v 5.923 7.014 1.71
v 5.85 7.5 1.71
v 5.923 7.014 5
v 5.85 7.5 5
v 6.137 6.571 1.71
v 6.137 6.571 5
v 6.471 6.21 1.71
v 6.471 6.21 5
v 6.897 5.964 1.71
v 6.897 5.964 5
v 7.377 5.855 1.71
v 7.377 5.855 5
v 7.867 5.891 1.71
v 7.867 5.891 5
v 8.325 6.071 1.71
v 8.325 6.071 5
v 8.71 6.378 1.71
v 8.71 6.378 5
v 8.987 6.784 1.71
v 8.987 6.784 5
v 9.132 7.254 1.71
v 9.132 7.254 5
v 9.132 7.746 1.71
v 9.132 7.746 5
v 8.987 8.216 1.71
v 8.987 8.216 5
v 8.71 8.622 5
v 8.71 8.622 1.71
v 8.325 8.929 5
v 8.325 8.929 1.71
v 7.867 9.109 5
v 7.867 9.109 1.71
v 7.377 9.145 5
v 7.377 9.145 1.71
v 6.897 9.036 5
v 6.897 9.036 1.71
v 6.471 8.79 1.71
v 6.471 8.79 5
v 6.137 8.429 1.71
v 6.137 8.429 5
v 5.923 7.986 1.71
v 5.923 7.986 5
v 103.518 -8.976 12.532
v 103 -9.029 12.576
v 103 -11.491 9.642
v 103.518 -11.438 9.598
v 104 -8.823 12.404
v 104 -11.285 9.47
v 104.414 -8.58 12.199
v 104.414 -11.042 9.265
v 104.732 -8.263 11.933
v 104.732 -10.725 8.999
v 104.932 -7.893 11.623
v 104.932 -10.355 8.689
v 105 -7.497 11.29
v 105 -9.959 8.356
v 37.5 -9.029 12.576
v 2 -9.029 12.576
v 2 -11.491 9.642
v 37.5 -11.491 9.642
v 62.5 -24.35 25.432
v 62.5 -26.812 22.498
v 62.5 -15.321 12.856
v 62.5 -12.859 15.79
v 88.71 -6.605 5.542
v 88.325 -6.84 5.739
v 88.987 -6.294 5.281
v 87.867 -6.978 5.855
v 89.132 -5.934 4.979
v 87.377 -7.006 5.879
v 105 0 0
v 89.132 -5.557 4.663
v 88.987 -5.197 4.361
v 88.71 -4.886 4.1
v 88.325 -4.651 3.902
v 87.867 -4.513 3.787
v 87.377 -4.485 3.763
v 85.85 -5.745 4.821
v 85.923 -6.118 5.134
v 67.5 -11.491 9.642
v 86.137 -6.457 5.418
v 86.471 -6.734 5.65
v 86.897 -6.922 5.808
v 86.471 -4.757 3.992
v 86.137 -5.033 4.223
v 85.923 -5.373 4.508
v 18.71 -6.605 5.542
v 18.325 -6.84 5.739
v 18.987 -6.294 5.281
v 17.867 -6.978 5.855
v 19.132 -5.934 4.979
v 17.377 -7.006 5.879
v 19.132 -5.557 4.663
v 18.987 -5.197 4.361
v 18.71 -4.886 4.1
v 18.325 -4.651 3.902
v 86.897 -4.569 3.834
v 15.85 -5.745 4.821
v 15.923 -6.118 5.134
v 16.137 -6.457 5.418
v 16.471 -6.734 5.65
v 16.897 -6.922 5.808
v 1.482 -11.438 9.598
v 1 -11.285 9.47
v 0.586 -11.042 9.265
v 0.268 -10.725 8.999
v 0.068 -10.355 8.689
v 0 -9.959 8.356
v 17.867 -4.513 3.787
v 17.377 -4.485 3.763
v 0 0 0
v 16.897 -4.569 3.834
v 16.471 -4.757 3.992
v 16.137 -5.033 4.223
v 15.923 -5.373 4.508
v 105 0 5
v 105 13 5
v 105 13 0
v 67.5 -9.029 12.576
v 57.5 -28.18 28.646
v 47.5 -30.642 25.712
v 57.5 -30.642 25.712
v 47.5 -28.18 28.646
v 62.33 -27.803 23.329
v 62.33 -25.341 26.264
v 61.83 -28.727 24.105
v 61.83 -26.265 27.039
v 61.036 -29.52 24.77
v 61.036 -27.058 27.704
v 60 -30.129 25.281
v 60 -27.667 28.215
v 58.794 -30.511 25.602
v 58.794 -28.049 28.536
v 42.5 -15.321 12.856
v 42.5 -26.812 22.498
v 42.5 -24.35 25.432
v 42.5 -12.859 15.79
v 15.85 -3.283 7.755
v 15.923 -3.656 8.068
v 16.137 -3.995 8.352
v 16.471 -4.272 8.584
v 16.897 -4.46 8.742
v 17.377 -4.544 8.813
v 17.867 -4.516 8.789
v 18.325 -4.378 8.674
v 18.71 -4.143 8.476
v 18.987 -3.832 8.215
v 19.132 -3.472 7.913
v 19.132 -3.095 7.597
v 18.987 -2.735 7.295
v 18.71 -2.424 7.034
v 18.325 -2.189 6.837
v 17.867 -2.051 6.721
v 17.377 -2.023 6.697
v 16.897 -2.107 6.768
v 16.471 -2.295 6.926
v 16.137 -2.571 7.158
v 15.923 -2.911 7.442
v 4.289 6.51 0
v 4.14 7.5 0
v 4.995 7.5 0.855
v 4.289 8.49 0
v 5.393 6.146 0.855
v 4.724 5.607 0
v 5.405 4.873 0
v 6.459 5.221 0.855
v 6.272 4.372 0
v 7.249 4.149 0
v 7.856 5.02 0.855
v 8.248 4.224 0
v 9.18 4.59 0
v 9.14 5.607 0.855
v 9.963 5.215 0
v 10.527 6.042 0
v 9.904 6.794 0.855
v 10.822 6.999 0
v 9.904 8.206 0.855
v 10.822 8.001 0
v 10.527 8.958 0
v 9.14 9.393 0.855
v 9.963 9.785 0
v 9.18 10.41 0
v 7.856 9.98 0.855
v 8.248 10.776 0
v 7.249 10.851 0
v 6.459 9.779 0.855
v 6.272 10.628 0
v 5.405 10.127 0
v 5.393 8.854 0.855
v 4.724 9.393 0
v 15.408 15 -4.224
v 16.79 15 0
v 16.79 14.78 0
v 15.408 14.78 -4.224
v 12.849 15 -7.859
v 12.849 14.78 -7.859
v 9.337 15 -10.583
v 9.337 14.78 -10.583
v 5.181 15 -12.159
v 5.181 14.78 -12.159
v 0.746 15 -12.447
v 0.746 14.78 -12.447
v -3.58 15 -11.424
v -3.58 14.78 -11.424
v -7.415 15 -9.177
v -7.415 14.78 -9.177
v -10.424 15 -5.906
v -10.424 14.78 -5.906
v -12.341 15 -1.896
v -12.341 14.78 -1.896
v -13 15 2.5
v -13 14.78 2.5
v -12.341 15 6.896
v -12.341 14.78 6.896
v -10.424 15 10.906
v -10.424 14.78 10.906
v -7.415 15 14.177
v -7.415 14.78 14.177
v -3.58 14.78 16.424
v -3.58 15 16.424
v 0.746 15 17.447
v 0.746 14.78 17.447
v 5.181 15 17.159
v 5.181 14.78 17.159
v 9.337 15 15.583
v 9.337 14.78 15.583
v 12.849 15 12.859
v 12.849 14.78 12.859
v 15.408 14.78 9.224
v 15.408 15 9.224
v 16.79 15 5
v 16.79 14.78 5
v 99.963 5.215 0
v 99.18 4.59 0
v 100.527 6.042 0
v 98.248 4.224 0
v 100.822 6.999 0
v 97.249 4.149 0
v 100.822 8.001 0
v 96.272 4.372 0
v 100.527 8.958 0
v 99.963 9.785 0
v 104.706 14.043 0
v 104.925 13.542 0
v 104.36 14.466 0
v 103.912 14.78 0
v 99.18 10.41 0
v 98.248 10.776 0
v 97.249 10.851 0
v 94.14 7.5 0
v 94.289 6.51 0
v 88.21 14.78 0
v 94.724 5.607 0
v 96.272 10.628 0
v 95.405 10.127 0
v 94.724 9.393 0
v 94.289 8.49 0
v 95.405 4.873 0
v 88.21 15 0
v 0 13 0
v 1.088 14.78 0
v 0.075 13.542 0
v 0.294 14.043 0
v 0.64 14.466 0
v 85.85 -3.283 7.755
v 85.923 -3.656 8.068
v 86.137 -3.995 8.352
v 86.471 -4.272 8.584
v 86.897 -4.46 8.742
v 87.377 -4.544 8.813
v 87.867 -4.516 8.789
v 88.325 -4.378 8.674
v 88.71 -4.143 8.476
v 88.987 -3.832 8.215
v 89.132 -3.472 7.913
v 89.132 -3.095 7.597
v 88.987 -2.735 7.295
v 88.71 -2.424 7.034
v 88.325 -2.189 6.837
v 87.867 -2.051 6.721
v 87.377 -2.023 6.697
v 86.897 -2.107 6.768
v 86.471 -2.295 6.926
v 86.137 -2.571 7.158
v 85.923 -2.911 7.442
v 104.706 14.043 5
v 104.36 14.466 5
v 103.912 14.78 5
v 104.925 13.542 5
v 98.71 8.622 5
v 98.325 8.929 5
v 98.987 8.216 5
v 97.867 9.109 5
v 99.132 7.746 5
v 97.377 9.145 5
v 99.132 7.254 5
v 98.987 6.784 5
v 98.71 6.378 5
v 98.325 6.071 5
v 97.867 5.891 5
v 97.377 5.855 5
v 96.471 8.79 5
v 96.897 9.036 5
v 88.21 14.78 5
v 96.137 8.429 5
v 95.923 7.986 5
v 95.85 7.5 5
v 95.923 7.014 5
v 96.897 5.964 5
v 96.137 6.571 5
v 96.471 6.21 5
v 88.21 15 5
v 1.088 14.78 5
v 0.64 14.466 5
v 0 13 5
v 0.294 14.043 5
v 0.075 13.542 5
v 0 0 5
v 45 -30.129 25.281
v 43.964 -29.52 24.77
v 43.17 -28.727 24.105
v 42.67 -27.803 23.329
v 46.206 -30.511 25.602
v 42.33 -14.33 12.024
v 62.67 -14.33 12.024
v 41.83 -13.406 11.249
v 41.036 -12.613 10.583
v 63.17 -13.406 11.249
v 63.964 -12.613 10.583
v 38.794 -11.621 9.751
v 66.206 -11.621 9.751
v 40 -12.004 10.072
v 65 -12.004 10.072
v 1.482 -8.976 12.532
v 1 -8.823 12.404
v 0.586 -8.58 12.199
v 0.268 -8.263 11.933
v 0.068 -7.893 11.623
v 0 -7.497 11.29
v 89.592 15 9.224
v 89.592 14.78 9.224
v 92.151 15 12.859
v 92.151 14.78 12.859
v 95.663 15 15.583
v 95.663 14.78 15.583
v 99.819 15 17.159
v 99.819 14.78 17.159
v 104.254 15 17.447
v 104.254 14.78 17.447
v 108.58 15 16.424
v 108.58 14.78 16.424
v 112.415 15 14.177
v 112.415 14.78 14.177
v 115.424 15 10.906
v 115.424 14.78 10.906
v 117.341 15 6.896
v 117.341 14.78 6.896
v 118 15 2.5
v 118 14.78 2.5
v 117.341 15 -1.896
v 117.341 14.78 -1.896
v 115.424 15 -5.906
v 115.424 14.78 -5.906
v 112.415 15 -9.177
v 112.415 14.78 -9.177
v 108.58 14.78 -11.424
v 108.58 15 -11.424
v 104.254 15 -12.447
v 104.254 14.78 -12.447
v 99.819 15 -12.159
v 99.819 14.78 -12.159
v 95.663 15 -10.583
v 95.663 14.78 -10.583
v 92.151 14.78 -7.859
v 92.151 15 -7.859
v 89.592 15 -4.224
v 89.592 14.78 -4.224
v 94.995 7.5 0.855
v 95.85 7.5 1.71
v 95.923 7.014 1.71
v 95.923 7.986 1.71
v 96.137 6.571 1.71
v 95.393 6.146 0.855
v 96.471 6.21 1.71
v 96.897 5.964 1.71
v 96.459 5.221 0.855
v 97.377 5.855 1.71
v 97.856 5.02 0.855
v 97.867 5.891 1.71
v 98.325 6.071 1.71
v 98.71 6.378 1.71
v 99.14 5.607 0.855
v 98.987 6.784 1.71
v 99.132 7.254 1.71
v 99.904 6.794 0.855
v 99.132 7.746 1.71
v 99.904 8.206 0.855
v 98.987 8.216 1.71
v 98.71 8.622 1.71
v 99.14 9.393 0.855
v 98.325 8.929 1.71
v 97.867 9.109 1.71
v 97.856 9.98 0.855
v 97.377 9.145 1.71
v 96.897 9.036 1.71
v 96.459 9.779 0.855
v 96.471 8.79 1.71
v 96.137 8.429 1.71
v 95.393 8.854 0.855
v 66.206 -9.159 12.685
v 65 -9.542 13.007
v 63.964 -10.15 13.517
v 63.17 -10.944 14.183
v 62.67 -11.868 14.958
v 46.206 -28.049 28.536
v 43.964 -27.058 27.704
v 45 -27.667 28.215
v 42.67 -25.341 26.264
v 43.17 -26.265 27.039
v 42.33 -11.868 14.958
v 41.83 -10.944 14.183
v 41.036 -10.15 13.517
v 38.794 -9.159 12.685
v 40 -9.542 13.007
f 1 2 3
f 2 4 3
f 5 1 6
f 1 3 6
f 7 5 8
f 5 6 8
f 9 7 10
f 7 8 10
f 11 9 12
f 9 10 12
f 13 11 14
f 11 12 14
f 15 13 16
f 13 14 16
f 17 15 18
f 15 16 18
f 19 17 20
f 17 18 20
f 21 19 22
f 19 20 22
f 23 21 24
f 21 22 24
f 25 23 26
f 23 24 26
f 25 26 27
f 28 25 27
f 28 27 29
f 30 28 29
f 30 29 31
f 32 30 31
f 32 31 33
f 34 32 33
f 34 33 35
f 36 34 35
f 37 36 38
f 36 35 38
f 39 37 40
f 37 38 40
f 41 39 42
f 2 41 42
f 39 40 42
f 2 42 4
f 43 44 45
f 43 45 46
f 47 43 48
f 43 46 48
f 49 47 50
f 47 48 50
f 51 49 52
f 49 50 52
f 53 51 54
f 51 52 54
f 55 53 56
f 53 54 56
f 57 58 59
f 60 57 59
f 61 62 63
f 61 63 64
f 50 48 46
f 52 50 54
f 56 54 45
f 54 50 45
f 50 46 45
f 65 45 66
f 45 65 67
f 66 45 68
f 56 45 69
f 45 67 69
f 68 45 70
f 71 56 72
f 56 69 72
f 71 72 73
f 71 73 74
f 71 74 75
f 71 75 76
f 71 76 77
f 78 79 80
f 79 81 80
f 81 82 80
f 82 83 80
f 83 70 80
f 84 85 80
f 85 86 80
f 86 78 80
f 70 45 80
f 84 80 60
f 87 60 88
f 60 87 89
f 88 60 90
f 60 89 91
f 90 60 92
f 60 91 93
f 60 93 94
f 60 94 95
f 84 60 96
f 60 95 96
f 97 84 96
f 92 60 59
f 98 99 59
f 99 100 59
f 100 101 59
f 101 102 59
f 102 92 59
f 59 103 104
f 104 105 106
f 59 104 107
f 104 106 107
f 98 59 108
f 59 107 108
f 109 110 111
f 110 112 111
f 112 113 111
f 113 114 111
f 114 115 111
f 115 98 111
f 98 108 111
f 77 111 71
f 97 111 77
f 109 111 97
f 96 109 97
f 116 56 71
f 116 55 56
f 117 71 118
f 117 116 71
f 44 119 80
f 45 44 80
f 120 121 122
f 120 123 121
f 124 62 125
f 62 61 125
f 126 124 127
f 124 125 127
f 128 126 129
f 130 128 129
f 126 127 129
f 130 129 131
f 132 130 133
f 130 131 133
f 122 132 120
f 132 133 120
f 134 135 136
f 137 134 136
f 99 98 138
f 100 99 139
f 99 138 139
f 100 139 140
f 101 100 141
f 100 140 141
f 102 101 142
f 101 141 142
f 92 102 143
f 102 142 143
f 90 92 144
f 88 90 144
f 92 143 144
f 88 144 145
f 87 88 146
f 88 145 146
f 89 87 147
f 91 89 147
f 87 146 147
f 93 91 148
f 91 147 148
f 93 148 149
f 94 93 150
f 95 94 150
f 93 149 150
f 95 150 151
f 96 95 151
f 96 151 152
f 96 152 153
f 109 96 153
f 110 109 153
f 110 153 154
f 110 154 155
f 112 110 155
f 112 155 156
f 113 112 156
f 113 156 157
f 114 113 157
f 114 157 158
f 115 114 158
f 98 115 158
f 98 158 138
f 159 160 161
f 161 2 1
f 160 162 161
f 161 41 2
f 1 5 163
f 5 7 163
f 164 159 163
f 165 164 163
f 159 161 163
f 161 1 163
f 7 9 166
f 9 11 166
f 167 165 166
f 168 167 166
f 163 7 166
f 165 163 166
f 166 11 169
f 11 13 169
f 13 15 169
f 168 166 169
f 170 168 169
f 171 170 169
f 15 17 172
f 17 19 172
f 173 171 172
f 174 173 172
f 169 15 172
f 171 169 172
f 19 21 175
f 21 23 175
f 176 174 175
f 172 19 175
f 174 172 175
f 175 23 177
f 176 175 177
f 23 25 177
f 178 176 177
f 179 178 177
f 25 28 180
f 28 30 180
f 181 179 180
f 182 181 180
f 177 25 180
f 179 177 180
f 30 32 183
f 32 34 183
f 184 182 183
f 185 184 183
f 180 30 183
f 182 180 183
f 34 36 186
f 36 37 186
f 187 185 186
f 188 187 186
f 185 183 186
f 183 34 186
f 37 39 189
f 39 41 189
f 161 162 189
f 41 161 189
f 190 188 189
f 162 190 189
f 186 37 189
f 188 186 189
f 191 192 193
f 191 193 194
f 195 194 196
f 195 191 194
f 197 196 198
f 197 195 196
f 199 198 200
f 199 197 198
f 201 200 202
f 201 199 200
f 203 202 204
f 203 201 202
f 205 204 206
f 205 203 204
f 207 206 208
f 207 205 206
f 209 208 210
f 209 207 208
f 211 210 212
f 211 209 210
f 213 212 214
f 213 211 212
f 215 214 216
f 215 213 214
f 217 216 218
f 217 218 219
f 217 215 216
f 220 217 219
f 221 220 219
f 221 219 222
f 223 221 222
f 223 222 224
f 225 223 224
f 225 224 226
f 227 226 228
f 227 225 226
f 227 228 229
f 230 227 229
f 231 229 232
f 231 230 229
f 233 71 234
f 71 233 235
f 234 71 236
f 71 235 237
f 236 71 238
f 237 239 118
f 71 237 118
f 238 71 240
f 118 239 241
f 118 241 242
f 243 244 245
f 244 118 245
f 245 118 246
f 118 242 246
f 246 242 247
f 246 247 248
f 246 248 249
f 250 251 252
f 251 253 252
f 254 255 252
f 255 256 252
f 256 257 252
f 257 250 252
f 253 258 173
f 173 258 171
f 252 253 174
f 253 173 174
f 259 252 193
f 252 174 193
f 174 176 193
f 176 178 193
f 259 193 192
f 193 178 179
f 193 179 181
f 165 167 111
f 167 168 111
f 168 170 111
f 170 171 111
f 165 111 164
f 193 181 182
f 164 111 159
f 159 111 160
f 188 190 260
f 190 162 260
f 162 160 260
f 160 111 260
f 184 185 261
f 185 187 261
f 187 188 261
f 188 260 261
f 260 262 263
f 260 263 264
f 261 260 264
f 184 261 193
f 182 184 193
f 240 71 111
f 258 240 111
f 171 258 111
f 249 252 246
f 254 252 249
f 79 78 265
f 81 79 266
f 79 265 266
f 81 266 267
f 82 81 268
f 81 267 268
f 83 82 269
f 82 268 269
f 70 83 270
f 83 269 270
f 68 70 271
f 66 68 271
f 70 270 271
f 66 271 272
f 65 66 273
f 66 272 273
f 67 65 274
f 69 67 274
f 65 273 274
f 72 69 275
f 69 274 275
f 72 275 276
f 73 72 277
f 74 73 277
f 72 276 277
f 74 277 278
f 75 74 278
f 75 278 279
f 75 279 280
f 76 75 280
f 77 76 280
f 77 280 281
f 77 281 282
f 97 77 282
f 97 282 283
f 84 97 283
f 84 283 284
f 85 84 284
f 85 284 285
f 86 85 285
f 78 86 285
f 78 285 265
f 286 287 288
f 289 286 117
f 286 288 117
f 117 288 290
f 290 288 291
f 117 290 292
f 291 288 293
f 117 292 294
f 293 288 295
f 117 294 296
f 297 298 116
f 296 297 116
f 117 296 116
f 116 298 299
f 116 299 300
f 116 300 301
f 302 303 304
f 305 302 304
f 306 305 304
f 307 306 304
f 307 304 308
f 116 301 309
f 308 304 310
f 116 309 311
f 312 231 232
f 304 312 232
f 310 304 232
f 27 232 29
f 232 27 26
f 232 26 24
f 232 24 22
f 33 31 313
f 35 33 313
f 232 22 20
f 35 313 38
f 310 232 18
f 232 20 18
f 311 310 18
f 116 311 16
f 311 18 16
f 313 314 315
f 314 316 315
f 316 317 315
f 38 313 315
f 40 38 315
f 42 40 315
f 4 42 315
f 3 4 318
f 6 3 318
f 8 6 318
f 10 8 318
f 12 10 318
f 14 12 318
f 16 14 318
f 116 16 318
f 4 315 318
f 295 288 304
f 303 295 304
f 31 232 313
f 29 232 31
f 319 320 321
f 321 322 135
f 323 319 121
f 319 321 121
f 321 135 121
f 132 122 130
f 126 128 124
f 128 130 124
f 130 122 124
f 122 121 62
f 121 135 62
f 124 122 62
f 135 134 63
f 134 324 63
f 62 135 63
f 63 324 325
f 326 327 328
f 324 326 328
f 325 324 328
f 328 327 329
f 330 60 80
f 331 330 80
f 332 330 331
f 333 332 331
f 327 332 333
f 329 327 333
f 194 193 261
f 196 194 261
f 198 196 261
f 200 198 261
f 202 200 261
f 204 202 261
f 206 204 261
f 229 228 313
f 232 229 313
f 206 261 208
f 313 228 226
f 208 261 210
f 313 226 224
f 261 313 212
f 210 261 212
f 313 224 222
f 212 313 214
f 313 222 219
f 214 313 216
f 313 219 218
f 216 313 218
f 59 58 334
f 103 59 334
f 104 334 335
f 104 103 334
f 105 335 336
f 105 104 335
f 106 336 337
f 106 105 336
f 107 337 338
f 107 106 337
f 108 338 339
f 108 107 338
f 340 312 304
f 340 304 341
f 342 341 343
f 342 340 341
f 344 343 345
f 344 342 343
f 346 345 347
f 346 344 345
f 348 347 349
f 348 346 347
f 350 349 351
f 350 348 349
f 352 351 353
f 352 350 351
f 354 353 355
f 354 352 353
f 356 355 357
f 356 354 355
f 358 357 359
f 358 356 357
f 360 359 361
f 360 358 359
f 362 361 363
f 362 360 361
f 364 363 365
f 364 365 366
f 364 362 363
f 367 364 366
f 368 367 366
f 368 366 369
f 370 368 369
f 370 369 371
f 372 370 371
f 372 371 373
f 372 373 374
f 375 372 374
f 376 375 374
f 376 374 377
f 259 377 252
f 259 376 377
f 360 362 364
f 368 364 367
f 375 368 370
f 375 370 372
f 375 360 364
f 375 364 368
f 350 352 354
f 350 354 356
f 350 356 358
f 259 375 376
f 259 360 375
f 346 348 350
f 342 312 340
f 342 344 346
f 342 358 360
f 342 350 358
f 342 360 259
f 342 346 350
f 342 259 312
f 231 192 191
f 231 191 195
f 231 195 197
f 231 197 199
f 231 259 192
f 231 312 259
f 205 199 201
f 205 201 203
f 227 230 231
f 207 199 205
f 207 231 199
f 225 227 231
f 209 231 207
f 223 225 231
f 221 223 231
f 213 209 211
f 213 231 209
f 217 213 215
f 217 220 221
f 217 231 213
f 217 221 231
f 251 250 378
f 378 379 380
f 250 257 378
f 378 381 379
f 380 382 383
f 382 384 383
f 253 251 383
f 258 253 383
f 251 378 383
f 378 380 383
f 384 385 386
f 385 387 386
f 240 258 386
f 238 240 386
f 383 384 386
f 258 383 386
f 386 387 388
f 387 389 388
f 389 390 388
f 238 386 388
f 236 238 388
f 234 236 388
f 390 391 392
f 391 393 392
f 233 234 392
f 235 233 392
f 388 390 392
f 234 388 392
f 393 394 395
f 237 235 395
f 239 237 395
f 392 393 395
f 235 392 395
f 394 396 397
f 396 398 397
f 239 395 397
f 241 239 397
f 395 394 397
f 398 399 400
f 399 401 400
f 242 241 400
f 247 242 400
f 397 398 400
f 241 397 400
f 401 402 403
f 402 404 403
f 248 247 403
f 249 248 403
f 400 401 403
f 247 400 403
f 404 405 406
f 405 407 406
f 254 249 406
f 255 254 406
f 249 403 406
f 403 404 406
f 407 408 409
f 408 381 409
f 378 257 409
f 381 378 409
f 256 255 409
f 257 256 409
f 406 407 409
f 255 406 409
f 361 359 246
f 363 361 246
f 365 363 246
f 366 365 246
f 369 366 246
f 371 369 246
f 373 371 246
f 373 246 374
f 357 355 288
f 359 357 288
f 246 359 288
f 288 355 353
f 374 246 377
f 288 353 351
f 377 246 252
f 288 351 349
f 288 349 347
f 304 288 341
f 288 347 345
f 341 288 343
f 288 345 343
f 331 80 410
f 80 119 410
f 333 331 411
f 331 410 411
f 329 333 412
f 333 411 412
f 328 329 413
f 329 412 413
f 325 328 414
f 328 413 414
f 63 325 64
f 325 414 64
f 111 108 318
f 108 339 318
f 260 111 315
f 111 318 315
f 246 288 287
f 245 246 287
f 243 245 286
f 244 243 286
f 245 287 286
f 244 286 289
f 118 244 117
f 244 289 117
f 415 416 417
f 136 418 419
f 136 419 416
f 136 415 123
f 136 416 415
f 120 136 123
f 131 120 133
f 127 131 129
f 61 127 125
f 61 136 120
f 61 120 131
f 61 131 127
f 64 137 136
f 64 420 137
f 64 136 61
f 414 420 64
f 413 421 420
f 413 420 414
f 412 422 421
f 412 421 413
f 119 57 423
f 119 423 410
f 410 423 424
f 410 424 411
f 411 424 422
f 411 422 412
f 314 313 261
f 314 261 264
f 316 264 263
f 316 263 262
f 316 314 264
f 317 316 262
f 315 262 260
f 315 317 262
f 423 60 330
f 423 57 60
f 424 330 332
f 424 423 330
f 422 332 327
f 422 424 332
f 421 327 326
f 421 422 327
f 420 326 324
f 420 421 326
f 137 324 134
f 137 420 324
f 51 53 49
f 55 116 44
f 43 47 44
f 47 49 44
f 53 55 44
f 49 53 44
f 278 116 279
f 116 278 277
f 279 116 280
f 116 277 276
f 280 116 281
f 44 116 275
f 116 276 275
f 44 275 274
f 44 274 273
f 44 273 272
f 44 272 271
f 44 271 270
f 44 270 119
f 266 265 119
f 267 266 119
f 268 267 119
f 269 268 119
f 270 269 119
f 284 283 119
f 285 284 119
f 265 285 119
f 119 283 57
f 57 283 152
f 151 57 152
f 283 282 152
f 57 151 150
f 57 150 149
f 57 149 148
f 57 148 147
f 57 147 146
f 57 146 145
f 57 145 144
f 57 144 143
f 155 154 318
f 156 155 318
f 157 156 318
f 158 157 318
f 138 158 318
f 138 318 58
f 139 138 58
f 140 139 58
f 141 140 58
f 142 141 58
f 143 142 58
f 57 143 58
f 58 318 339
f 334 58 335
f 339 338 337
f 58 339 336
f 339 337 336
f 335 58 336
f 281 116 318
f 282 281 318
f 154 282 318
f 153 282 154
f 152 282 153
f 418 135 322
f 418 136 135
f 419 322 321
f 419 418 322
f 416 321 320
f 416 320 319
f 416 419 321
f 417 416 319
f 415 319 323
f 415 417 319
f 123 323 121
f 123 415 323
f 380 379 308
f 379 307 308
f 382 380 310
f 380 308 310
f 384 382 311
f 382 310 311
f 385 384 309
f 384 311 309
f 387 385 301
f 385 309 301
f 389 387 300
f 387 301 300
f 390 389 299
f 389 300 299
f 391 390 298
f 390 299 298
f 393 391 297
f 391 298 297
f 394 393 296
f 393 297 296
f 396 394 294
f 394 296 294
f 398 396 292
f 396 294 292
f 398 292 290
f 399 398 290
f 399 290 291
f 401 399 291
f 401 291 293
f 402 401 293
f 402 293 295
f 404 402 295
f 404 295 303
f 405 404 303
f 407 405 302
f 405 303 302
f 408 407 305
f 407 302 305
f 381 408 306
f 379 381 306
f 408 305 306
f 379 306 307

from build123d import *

# Parameters (mm, degrees)
F1_DEPTH       = 105
F3_R           = 2
F4_D           = 3.3
F4_DEPTH       = 15
F4_CSINK_D     = 6.72
F4_CSINK_ANGLE = 90
F4_TIP         = 0.9914200214
F6_D           = 3.3
F6_DEPTH       = 15
F6_TIP         = 0.9914200214
F7_W           = 20
F7_H           = 3.8302222156
F8_DEPTH       = 25
F9_R           = 5
F11_DEPTH      = 0.22


with BuildPart() as f1:
    # F0 (on Right) → F1 (new body)
    with BuildSketch(Plane.YZ):
        Polygon((-11.4906666468, 9.6418141453), (0, 0), (15, 0), (15, 5), (0, 5), (-9.0286472643, 12.5759345895), align=None)
    extrude(amount=F1_DEPTH)

    # F3
    f3_edges = [f1.edges().sort_by_distance(p)[0] for p in [
        (0, 15, 2.5),
        (105, 15, 2.5),
        (105, -10.259657, 11.108874),
        (0, -10.259657, 11.108874),
    ]]
    fillet(f3_edges, radius=F3_R)

    # F4
    with Locations(Plane(origin=(0, 0, 0), x_dir=(1, 0, 0), z_dir=(0, 0, -1))):
        with Locations((7.5, -7.5), (97.5, -7.5)):
            CounterSinkHole(F4_D / 2, F4_CSINK_D / 2, depth=F4_DEPTH, counter_sink_angle=F4_CSINK_ANGLE)
            with Locations((0, 0, -(F4_DEPTH + F4_TIP / 2))):  # 118° drill point
                Cone(0, F4_D / 2, F4_TIP, mode=Mode.SUBTRACT)

    # F6
    with Locations(Plane(origin=(0, 0, 0), x_dir=(1, 0, 0), z_dir=(0, -0.6427876097, -0.7660444431))):
        with Locations((17.5, 7.5), (87.5, 7.5)):
            Hole(F6_D / 2, depth=F6_DEPTH)
            with Locations((0, 0, -(F6_DEPTH + F6_TIP / 2))):  # 118° drill point
                Cone(0, F6_D / 2, F6_TIP, mode=Mode.SUBTRACT)

    # F7 (on face) → F8 (join)
    with BuildSketch(Plane(origin=(0, -11.4906666468, 9.6418141453), x_dir=(1, 0, 0), z_dir=(0, -0.7660444431, 0.6427876097))):
        with Locations((52.5, 1.9151111078)):
            Rectangle(F7_W, F7_H)
    extrude(amount=F8_DEPTH)

    # F9
    f9_edges = [f1.edges().sort_by_distance(p)[0] for p in [
        (42.5, -10.259657, 11.108874),
        (62.5, -10.259657, 11.108874),
        (62.5, -29.410768, 27.178565),
        (42.5, -29.410768, 27.178565),
    ]]
    fillet(f9_edges, radius=F9_R)

    # F10 (on face) → F11 (join)
    with BuildSketch(Plane(origin=(0, 15, 0), x_dir=(-1, 0, 0), z_dir=(0, 1, 0))):
        with BuildLine():
            ThreePointArc((13, 2.5), (-0.7456060958, 17.4474578418), (-16.7901994577, 5))
            Line((-16.7901994577, 5), (-2, 5))
            Line((-2, 5), (-2, 0))
            Line((-2, 0), (-16.7901994577, 0))
            ThreePointArc((-16.7901994577, 0), (-0.7456060958, -12.4474578418), (13, 2.5))
        make_face()
        with BuildLine():
            Line((-103, 5), (-88.2098005423, 5))
            ThreePointArc((-88.2098005423, 5), (-118, 2.5), (-88.2098005423, 0))
            Line((-88.2098005423, 0), (-103, 0))
            Line((-103, 0), (-103, 5))
        make_face()
    extrude(amount=-F11_DEPTH)


solid = f1.part
